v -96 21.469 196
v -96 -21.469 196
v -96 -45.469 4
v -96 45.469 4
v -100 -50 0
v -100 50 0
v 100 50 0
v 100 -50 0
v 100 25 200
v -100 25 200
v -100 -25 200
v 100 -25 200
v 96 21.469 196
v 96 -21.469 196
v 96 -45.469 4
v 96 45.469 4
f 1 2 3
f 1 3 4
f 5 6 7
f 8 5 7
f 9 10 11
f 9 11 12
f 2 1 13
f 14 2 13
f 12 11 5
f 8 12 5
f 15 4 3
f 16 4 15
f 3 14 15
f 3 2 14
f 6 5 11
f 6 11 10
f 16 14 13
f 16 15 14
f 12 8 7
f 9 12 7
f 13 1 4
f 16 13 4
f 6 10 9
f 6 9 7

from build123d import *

# Parameters (mm, degrees)
CROQUIS1_W              = 200
CROQUIS1_H              = 100
SALIENTE_EXTRUIR1_DEPTH = 200
CORTAR_EXTRUIR1_DEPTH   = 200
CORTAR_EXTRUIR2_DEPTH   = 200
VACIADO1_T              = 4


with BuildPart() as part:
    # Croquis1 → Saliente-Extruir1 (new body)
    with BuildSketch(Plane.XY):
        Rectangle(CROQUIS1_W, CROQUIS1_H)
    extrude(amount=SALIENTE_EXTRUIR1_DEPTH)

    # Croquis18 → Cortar-Extruir1 (cut)
    with BuildSketch(Plane.ZY.offset(100)):
        Polygon((0, 50), (200, 50), (200, 25), align=None)
    extrude(amount=-CORTAR_EXTRUIR1_DEPTH, mode=Mode.SUBTRACT)

    # Croquis20 → Cortar-Extruir2 (cut)
    with BuildSketch(Plane.ZY.offset(100)):
        Polygon((0, -50), (200, -50), (200, -25), align=None)
    extrude(amount=-CORTAR_EXTRUIR2_DEPTH, mode=Mode.SUBTRACT)

    # Vaciado1 (no face opened: a closed hollow body)
    add(offset(amount=-VACIADO1_T, mode=Mode.PRIVATE), mode=Mode.SUBTRACT)


solid = part.part
